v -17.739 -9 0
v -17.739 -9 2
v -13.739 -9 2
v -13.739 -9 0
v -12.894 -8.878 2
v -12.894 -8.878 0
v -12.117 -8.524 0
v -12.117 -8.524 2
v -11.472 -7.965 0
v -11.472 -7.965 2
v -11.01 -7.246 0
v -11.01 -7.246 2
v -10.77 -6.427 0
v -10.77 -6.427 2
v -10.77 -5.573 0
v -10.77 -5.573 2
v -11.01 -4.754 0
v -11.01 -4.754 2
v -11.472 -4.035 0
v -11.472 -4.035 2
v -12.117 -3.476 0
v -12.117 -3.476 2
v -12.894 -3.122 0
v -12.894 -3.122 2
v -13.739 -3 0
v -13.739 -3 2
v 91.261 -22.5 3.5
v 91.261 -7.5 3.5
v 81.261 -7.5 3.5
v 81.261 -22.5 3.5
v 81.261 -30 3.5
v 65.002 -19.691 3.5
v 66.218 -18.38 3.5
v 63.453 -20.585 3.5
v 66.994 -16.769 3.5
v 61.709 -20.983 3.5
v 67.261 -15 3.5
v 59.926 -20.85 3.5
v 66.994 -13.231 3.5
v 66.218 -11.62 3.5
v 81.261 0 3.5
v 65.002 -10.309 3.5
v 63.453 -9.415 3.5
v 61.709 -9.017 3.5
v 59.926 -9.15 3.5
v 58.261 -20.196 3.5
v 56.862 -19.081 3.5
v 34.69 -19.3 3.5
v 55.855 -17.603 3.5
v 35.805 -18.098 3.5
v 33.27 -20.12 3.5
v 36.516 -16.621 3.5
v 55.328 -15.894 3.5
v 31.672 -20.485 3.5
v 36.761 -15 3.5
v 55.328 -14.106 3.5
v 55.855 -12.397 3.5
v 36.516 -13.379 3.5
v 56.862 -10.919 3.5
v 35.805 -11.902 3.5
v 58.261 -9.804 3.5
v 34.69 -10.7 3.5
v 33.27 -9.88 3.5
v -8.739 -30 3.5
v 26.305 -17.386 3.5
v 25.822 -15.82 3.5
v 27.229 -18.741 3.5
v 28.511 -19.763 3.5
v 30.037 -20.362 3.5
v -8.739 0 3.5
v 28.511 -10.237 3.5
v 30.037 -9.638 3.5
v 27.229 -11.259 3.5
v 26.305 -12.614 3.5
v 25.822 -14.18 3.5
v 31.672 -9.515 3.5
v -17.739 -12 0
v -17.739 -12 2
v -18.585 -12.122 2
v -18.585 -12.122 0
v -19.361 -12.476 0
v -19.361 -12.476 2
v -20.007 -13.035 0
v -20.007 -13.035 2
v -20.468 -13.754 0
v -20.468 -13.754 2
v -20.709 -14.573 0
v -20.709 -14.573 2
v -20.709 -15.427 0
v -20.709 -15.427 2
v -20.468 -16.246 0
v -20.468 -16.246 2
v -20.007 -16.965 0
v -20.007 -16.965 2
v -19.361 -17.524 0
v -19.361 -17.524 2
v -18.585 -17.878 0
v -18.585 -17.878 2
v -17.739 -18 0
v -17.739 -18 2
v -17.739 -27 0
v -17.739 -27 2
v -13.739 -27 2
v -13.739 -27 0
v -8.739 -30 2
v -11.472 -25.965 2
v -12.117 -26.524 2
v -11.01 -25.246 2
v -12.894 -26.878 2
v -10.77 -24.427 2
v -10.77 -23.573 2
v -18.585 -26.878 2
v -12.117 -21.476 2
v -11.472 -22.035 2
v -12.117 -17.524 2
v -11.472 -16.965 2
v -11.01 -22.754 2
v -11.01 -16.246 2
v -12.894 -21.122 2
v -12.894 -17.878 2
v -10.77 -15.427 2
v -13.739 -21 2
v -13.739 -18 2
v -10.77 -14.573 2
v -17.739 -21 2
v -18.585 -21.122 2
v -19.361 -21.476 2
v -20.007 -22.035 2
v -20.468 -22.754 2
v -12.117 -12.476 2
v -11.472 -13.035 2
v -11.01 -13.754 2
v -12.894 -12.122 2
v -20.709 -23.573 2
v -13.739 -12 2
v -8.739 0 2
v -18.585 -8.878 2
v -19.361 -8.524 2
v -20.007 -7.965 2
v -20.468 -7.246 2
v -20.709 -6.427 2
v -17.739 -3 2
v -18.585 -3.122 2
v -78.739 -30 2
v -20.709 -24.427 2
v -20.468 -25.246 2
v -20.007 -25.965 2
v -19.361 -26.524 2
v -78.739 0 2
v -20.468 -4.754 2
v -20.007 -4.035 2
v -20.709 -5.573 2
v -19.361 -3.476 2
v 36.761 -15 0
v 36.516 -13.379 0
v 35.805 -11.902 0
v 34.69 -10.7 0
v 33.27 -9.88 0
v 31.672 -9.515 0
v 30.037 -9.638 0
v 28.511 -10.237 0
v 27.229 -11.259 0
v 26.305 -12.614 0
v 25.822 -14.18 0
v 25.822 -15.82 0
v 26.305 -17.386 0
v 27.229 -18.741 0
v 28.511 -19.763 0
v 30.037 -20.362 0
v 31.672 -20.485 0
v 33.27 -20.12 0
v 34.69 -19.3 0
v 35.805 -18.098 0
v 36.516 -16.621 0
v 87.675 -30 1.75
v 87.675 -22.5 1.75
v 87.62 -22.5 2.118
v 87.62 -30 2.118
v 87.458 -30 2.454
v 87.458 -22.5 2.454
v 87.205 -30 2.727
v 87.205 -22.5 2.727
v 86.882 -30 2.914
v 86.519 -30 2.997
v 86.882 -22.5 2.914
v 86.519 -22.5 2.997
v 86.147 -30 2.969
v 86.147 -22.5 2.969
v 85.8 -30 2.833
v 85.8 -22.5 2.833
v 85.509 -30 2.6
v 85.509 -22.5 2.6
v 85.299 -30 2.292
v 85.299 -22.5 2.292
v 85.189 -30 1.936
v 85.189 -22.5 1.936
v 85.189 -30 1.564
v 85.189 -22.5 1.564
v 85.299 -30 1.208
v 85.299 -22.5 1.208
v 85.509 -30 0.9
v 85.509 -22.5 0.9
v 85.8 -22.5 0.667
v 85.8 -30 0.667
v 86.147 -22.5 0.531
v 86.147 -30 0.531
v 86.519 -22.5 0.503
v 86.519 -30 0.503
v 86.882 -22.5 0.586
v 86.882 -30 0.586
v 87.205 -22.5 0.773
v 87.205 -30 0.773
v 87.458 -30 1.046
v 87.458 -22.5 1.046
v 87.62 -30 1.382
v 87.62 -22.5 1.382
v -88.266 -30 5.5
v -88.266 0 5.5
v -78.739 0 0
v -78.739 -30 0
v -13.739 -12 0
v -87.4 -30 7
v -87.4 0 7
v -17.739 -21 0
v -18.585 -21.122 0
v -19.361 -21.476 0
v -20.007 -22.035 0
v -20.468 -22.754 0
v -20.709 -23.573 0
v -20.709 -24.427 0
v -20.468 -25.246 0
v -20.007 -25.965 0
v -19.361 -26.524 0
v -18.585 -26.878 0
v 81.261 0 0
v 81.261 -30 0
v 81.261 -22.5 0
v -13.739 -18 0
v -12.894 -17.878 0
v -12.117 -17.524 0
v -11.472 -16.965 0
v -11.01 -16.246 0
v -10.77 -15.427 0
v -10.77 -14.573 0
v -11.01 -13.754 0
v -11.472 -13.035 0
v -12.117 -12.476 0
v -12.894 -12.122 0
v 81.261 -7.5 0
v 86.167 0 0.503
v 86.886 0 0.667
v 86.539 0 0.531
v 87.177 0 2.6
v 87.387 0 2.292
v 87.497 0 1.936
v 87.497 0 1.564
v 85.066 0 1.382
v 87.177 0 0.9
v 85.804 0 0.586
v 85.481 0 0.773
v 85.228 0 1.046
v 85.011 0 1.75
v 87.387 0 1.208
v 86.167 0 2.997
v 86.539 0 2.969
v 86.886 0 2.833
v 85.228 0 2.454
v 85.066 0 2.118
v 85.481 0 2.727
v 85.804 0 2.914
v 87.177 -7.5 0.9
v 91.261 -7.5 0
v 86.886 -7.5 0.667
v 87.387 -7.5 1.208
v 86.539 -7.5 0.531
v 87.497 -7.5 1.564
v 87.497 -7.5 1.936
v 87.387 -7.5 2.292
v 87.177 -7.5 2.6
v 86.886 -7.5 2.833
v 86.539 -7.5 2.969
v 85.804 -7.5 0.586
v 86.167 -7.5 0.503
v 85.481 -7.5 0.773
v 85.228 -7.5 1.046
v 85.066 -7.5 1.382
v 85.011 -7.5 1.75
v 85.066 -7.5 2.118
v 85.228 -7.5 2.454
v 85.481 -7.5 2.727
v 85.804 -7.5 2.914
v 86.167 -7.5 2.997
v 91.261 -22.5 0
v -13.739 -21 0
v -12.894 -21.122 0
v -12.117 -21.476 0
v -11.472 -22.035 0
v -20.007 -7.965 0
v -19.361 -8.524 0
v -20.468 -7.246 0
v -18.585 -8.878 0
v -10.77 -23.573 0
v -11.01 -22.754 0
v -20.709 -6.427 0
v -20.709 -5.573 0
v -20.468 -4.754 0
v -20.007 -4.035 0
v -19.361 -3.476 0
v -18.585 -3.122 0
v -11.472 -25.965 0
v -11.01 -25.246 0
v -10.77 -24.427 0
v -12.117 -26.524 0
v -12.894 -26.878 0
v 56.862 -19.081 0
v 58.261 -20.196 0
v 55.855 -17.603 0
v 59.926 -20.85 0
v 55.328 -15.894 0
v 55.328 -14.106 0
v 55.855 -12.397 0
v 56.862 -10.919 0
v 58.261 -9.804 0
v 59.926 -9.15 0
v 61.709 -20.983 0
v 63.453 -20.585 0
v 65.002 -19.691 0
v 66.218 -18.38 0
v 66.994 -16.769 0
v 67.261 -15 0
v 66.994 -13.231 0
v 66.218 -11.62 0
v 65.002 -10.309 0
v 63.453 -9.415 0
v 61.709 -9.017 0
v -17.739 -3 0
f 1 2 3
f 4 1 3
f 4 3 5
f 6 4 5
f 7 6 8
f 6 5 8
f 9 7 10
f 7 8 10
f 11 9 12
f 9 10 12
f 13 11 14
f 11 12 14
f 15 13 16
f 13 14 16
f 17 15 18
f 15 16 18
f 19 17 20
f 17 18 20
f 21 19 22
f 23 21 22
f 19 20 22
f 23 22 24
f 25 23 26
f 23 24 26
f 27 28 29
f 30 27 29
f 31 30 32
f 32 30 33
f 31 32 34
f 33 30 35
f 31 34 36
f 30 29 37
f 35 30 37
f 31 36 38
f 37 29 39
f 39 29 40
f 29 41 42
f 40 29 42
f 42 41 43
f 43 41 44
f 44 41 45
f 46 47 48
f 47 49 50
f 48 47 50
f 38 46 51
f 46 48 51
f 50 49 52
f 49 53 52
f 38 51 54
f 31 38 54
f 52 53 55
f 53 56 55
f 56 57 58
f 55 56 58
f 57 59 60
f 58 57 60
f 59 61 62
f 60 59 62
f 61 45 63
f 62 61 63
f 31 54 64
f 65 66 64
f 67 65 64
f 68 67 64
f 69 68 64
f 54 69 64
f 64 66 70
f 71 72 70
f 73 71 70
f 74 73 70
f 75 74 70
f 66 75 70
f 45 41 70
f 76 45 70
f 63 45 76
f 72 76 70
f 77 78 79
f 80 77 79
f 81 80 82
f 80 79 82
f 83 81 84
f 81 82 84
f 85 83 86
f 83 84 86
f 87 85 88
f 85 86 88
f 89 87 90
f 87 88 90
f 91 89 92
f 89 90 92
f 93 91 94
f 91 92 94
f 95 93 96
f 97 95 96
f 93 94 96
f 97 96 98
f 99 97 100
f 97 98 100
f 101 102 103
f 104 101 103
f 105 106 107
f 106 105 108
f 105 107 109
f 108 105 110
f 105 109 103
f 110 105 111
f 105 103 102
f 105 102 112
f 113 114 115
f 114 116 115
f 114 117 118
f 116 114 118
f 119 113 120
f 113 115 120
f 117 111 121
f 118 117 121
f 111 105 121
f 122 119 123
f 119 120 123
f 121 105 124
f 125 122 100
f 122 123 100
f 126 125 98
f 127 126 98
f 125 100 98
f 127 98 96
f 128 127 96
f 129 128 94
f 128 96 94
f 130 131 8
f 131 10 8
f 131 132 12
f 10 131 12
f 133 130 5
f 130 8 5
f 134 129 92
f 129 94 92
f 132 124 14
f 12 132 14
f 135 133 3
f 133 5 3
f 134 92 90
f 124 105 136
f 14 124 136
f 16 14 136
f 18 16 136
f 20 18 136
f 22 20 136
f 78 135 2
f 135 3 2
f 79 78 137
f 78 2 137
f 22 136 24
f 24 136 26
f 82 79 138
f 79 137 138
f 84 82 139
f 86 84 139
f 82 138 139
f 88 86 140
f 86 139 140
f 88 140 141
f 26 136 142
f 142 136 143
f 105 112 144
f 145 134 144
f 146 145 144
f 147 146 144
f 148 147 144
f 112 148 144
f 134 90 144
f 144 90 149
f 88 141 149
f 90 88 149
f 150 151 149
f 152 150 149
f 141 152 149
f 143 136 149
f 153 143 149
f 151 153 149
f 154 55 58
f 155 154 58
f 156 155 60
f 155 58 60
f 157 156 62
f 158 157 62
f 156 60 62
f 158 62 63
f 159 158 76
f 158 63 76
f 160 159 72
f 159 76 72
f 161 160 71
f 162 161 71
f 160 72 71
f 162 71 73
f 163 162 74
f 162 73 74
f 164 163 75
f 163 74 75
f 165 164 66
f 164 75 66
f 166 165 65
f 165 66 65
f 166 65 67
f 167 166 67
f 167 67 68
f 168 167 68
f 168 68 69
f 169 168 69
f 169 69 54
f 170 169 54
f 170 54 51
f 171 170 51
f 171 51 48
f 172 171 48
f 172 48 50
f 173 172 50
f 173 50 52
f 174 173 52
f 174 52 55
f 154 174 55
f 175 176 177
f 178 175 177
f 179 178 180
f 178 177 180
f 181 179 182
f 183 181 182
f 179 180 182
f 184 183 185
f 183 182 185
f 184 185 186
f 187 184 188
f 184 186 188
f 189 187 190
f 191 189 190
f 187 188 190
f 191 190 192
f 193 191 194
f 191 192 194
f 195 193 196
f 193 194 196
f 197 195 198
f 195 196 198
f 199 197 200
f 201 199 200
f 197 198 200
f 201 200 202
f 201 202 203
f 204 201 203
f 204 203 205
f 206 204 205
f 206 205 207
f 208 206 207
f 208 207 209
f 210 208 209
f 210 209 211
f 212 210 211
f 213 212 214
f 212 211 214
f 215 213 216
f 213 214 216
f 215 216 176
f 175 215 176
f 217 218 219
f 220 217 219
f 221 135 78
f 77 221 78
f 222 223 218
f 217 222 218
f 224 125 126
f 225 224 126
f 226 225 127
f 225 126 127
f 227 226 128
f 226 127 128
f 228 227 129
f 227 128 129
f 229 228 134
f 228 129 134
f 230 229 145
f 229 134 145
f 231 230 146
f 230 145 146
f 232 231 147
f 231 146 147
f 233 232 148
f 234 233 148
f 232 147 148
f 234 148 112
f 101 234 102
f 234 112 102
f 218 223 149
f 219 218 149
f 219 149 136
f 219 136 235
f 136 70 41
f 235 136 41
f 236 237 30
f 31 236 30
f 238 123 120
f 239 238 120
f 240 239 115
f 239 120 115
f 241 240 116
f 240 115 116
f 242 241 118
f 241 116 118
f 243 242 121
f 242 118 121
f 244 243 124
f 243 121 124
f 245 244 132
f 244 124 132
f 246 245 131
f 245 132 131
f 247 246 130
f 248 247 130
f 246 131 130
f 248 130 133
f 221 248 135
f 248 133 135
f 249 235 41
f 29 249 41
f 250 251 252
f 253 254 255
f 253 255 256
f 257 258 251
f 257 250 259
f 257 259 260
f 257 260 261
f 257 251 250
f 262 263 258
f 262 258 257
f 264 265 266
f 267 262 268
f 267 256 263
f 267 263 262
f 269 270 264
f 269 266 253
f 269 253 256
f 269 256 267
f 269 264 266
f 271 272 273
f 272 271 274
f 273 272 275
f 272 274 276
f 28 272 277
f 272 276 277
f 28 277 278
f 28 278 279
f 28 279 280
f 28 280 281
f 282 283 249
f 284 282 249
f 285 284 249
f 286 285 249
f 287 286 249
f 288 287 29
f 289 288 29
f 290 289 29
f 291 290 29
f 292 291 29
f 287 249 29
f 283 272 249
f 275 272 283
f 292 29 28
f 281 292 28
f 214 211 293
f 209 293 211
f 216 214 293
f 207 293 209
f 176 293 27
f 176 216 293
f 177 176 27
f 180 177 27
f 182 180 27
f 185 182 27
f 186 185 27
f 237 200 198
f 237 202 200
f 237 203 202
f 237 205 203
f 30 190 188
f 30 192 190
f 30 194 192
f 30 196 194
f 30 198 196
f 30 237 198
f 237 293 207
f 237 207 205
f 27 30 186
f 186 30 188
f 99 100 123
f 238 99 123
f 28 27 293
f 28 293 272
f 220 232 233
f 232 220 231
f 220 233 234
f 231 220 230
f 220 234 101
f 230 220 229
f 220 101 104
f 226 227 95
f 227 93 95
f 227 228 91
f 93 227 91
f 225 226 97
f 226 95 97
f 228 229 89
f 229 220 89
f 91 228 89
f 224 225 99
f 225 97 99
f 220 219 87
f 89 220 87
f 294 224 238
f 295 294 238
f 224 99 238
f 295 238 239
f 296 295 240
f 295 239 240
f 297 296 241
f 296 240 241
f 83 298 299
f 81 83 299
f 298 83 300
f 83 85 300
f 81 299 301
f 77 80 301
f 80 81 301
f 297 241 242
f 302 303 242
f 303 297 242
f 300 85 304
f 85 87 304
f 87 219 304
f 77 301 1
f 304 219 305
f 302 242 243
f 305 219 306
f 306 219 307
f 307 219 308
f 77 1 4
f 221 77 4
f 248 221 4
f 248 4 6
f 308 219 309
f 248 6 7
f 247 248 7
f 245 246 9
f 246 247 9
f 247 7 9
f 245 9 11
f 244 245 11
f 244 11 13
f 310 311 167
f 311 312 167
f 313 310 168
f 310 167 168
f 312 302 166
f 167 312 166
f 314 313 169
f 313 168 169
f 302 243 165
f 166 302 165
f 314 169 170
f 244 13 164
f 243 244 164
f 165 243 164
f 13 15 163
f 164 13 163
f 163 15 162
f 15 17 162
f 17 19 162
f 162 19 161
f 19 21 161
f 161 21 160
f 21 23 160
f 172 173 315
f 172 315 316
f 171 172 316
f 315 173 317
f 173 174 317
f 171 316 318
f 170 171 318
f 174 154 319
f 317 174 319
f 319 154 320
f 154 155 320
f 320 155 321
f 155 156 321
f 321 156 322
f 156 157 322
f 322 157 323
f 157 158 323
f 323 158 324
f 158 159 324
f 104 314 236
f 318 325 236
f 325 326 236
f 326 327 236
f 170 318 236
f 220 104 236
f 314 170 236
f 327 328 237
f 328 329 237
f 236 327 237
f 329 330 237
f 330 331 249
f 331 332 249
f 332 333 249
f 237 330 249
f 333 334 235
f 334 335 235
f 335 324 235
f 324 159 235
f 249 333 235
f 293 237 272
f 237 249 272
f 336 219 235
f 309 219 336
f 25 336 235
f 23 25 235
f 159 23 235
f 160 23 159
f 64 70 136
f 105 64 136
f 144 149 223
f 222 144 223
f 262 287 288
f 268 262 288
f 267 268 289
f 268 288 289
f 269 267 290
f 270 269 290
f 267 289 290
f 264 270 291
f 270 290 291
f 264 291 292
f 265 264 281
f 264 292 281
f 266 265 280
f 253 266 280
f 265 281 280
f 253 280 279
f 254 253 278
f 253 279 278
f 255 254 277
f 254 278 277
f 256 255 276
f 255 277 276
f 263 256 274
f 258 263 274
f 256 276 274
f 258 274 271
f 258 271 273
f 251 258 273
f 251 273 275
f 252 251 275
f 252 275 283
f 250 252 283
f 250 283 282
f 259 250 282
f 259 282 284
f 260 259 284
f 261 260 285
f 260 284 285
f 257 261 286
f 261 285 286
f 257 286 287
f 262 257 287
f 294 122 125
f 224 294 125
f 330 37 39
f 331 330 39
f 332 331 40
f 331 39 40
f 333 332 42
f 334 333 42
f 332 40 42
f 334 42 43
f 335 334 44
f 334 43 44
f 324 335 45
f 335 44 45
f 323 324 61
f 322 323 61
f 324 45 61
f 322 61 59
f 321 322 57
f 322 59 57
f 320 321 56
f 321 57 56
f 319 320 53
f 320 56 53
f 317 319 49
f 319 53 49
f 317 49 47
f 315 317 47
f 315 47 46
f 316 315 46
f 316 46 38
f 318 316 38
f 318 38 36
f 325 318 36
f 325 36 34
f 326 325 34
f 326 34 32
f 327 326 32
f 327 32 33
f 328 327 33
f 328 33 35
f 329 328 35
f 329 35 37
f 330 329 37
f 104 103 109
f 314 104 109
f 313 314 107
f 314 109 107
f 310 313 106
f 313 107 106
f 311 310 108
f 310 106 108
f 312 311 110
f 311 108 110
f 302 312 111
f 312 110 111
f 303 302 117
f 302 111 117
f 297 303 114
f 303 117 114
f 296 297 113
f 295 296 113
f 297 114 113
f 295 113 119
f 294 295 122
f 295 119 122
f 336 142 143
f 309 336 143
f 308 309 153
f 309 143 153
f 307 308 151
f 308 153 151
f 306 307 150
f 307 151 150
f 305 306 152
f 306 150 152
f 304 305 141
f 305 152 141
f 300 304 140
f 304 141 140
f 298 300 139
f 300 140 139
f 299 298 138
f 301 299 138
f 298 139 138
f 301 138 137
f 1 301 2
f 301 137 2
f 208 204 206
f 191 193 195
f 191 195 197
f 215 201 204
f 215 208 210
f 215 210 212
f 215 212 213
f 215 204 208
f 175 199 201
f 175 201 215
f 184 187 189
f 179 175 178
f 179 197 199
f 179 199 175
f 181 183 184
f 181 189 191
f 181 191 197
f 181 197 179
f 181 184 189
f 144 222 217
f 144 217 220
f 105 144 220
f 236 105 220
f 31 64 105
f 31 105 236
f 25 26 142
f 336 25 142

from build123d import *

# Parameters (mm, degrees)
F1_DEPTH  = 30
F2_W      = 15
F2_H      = 3.5
F3_DEPTH  = 10
F4_R      = 1.25
F5_DEPTH  = 7.5
F6_R      = 1.25
F7_DEPTH  = 7.5
F9_DEPTH  = 25
F10_R     = 6
F10_R_2   = 5.5
F11_DEPTH = 25


with BuildPart() as f1:
    # F0 (on Front) → F1 (new body)
    with BuildSketch(Plane.XZ):
        Polygon((-8.73931, 2), (-78.73931, 2), (-87.399564, 7), (-88.265589, 5.5), (-78.73931, 0), (-8.73931, 0), (81.26069, 0), (81.26069, 3.5), (-8.73931, 3.5), align=None)
    extrude(amount=F1_DEPTH)

    # F2 (on face) → F3 (join)
    with BuildSketch(Plane.YZ.offset(81.26069)):
        with Locations((-15, 1.75)):
            Rectangle(F2_W, F2_H)
    extrude(amount=F3_DEPTH)

    # F4 (on face) → F5 (join)
    with BuildSketch(Plane.XZ.offset(22.5)):
        with Locations((86.425211, 1.75)):
            Circle(F4_R)
    extrude(amount=F5_DEPTH)

    # F6 (on face) → F7 (join)
    with BuildSketch(Plane(origin=(0, -7.5, 0), x_dir=(-1, 0, 0), z_dir=(0, 1, 0))):
        with Locations((-86.26069, 1.75)):
            Circle(F6_R)
    extrude(amount=F7_DEPTH)

    # F8 (on face) → F9 (cut)
    with BuildSketch(Plane.XY.offset(2)):
        with BuildLine():
            Line((-17.73931, -18), (-13.73931, -18))
            ThreePointArc((-13.73931, -18), (-10.73931, -15), (-13.73931, -12))
            Line((-13.73931, -12), (-17.73931, -12))
            ThreePointArc((-17.73931, -12), (-20.73931, -15), (-17.73931, -18))
        make_face()
        with BuildLine():
            Line((-13.73931, -21), (-17.73931, -21))
            ThreePointArc((-17.73931, -21), (-20.73931, -24), (-17.73931, -27))
            Line((-17.73931, -27), (-13.73931, -27))
            ThreePointArc((-13.73931, -27), (-10.73931, -24), (-13.73931, -21))
        make_face()
        with BuildLine():
            ThreePointArc((-17.73931, -3), (-20.73931, -6), (-17.73931, -9))
            Line((-17.73931, -9), (-13.73931, -9))
            ThreePointArc((-13.73931, -9), (-10.73931, -6), (-13.73931, -3))
            Line((-13.73931, -3), (-17.73931, -3))
        make_face()
    extrude(amount=-F9_DEPTH, mode=Mode.SUBTRACT)

    # F10 (on face) → F11 (cut)
    with BuildSketch(Plane.XY.offset(3.5)):
        with Locations((61.26069, -15)):
            Circle(F10_R)
        with Locations((31.26069, -15)):
            Circle(F10_R_2)
    extrude(amount=-F11_DEPTH, mode=Mode.SUBTRACT)


solid = f1.part
